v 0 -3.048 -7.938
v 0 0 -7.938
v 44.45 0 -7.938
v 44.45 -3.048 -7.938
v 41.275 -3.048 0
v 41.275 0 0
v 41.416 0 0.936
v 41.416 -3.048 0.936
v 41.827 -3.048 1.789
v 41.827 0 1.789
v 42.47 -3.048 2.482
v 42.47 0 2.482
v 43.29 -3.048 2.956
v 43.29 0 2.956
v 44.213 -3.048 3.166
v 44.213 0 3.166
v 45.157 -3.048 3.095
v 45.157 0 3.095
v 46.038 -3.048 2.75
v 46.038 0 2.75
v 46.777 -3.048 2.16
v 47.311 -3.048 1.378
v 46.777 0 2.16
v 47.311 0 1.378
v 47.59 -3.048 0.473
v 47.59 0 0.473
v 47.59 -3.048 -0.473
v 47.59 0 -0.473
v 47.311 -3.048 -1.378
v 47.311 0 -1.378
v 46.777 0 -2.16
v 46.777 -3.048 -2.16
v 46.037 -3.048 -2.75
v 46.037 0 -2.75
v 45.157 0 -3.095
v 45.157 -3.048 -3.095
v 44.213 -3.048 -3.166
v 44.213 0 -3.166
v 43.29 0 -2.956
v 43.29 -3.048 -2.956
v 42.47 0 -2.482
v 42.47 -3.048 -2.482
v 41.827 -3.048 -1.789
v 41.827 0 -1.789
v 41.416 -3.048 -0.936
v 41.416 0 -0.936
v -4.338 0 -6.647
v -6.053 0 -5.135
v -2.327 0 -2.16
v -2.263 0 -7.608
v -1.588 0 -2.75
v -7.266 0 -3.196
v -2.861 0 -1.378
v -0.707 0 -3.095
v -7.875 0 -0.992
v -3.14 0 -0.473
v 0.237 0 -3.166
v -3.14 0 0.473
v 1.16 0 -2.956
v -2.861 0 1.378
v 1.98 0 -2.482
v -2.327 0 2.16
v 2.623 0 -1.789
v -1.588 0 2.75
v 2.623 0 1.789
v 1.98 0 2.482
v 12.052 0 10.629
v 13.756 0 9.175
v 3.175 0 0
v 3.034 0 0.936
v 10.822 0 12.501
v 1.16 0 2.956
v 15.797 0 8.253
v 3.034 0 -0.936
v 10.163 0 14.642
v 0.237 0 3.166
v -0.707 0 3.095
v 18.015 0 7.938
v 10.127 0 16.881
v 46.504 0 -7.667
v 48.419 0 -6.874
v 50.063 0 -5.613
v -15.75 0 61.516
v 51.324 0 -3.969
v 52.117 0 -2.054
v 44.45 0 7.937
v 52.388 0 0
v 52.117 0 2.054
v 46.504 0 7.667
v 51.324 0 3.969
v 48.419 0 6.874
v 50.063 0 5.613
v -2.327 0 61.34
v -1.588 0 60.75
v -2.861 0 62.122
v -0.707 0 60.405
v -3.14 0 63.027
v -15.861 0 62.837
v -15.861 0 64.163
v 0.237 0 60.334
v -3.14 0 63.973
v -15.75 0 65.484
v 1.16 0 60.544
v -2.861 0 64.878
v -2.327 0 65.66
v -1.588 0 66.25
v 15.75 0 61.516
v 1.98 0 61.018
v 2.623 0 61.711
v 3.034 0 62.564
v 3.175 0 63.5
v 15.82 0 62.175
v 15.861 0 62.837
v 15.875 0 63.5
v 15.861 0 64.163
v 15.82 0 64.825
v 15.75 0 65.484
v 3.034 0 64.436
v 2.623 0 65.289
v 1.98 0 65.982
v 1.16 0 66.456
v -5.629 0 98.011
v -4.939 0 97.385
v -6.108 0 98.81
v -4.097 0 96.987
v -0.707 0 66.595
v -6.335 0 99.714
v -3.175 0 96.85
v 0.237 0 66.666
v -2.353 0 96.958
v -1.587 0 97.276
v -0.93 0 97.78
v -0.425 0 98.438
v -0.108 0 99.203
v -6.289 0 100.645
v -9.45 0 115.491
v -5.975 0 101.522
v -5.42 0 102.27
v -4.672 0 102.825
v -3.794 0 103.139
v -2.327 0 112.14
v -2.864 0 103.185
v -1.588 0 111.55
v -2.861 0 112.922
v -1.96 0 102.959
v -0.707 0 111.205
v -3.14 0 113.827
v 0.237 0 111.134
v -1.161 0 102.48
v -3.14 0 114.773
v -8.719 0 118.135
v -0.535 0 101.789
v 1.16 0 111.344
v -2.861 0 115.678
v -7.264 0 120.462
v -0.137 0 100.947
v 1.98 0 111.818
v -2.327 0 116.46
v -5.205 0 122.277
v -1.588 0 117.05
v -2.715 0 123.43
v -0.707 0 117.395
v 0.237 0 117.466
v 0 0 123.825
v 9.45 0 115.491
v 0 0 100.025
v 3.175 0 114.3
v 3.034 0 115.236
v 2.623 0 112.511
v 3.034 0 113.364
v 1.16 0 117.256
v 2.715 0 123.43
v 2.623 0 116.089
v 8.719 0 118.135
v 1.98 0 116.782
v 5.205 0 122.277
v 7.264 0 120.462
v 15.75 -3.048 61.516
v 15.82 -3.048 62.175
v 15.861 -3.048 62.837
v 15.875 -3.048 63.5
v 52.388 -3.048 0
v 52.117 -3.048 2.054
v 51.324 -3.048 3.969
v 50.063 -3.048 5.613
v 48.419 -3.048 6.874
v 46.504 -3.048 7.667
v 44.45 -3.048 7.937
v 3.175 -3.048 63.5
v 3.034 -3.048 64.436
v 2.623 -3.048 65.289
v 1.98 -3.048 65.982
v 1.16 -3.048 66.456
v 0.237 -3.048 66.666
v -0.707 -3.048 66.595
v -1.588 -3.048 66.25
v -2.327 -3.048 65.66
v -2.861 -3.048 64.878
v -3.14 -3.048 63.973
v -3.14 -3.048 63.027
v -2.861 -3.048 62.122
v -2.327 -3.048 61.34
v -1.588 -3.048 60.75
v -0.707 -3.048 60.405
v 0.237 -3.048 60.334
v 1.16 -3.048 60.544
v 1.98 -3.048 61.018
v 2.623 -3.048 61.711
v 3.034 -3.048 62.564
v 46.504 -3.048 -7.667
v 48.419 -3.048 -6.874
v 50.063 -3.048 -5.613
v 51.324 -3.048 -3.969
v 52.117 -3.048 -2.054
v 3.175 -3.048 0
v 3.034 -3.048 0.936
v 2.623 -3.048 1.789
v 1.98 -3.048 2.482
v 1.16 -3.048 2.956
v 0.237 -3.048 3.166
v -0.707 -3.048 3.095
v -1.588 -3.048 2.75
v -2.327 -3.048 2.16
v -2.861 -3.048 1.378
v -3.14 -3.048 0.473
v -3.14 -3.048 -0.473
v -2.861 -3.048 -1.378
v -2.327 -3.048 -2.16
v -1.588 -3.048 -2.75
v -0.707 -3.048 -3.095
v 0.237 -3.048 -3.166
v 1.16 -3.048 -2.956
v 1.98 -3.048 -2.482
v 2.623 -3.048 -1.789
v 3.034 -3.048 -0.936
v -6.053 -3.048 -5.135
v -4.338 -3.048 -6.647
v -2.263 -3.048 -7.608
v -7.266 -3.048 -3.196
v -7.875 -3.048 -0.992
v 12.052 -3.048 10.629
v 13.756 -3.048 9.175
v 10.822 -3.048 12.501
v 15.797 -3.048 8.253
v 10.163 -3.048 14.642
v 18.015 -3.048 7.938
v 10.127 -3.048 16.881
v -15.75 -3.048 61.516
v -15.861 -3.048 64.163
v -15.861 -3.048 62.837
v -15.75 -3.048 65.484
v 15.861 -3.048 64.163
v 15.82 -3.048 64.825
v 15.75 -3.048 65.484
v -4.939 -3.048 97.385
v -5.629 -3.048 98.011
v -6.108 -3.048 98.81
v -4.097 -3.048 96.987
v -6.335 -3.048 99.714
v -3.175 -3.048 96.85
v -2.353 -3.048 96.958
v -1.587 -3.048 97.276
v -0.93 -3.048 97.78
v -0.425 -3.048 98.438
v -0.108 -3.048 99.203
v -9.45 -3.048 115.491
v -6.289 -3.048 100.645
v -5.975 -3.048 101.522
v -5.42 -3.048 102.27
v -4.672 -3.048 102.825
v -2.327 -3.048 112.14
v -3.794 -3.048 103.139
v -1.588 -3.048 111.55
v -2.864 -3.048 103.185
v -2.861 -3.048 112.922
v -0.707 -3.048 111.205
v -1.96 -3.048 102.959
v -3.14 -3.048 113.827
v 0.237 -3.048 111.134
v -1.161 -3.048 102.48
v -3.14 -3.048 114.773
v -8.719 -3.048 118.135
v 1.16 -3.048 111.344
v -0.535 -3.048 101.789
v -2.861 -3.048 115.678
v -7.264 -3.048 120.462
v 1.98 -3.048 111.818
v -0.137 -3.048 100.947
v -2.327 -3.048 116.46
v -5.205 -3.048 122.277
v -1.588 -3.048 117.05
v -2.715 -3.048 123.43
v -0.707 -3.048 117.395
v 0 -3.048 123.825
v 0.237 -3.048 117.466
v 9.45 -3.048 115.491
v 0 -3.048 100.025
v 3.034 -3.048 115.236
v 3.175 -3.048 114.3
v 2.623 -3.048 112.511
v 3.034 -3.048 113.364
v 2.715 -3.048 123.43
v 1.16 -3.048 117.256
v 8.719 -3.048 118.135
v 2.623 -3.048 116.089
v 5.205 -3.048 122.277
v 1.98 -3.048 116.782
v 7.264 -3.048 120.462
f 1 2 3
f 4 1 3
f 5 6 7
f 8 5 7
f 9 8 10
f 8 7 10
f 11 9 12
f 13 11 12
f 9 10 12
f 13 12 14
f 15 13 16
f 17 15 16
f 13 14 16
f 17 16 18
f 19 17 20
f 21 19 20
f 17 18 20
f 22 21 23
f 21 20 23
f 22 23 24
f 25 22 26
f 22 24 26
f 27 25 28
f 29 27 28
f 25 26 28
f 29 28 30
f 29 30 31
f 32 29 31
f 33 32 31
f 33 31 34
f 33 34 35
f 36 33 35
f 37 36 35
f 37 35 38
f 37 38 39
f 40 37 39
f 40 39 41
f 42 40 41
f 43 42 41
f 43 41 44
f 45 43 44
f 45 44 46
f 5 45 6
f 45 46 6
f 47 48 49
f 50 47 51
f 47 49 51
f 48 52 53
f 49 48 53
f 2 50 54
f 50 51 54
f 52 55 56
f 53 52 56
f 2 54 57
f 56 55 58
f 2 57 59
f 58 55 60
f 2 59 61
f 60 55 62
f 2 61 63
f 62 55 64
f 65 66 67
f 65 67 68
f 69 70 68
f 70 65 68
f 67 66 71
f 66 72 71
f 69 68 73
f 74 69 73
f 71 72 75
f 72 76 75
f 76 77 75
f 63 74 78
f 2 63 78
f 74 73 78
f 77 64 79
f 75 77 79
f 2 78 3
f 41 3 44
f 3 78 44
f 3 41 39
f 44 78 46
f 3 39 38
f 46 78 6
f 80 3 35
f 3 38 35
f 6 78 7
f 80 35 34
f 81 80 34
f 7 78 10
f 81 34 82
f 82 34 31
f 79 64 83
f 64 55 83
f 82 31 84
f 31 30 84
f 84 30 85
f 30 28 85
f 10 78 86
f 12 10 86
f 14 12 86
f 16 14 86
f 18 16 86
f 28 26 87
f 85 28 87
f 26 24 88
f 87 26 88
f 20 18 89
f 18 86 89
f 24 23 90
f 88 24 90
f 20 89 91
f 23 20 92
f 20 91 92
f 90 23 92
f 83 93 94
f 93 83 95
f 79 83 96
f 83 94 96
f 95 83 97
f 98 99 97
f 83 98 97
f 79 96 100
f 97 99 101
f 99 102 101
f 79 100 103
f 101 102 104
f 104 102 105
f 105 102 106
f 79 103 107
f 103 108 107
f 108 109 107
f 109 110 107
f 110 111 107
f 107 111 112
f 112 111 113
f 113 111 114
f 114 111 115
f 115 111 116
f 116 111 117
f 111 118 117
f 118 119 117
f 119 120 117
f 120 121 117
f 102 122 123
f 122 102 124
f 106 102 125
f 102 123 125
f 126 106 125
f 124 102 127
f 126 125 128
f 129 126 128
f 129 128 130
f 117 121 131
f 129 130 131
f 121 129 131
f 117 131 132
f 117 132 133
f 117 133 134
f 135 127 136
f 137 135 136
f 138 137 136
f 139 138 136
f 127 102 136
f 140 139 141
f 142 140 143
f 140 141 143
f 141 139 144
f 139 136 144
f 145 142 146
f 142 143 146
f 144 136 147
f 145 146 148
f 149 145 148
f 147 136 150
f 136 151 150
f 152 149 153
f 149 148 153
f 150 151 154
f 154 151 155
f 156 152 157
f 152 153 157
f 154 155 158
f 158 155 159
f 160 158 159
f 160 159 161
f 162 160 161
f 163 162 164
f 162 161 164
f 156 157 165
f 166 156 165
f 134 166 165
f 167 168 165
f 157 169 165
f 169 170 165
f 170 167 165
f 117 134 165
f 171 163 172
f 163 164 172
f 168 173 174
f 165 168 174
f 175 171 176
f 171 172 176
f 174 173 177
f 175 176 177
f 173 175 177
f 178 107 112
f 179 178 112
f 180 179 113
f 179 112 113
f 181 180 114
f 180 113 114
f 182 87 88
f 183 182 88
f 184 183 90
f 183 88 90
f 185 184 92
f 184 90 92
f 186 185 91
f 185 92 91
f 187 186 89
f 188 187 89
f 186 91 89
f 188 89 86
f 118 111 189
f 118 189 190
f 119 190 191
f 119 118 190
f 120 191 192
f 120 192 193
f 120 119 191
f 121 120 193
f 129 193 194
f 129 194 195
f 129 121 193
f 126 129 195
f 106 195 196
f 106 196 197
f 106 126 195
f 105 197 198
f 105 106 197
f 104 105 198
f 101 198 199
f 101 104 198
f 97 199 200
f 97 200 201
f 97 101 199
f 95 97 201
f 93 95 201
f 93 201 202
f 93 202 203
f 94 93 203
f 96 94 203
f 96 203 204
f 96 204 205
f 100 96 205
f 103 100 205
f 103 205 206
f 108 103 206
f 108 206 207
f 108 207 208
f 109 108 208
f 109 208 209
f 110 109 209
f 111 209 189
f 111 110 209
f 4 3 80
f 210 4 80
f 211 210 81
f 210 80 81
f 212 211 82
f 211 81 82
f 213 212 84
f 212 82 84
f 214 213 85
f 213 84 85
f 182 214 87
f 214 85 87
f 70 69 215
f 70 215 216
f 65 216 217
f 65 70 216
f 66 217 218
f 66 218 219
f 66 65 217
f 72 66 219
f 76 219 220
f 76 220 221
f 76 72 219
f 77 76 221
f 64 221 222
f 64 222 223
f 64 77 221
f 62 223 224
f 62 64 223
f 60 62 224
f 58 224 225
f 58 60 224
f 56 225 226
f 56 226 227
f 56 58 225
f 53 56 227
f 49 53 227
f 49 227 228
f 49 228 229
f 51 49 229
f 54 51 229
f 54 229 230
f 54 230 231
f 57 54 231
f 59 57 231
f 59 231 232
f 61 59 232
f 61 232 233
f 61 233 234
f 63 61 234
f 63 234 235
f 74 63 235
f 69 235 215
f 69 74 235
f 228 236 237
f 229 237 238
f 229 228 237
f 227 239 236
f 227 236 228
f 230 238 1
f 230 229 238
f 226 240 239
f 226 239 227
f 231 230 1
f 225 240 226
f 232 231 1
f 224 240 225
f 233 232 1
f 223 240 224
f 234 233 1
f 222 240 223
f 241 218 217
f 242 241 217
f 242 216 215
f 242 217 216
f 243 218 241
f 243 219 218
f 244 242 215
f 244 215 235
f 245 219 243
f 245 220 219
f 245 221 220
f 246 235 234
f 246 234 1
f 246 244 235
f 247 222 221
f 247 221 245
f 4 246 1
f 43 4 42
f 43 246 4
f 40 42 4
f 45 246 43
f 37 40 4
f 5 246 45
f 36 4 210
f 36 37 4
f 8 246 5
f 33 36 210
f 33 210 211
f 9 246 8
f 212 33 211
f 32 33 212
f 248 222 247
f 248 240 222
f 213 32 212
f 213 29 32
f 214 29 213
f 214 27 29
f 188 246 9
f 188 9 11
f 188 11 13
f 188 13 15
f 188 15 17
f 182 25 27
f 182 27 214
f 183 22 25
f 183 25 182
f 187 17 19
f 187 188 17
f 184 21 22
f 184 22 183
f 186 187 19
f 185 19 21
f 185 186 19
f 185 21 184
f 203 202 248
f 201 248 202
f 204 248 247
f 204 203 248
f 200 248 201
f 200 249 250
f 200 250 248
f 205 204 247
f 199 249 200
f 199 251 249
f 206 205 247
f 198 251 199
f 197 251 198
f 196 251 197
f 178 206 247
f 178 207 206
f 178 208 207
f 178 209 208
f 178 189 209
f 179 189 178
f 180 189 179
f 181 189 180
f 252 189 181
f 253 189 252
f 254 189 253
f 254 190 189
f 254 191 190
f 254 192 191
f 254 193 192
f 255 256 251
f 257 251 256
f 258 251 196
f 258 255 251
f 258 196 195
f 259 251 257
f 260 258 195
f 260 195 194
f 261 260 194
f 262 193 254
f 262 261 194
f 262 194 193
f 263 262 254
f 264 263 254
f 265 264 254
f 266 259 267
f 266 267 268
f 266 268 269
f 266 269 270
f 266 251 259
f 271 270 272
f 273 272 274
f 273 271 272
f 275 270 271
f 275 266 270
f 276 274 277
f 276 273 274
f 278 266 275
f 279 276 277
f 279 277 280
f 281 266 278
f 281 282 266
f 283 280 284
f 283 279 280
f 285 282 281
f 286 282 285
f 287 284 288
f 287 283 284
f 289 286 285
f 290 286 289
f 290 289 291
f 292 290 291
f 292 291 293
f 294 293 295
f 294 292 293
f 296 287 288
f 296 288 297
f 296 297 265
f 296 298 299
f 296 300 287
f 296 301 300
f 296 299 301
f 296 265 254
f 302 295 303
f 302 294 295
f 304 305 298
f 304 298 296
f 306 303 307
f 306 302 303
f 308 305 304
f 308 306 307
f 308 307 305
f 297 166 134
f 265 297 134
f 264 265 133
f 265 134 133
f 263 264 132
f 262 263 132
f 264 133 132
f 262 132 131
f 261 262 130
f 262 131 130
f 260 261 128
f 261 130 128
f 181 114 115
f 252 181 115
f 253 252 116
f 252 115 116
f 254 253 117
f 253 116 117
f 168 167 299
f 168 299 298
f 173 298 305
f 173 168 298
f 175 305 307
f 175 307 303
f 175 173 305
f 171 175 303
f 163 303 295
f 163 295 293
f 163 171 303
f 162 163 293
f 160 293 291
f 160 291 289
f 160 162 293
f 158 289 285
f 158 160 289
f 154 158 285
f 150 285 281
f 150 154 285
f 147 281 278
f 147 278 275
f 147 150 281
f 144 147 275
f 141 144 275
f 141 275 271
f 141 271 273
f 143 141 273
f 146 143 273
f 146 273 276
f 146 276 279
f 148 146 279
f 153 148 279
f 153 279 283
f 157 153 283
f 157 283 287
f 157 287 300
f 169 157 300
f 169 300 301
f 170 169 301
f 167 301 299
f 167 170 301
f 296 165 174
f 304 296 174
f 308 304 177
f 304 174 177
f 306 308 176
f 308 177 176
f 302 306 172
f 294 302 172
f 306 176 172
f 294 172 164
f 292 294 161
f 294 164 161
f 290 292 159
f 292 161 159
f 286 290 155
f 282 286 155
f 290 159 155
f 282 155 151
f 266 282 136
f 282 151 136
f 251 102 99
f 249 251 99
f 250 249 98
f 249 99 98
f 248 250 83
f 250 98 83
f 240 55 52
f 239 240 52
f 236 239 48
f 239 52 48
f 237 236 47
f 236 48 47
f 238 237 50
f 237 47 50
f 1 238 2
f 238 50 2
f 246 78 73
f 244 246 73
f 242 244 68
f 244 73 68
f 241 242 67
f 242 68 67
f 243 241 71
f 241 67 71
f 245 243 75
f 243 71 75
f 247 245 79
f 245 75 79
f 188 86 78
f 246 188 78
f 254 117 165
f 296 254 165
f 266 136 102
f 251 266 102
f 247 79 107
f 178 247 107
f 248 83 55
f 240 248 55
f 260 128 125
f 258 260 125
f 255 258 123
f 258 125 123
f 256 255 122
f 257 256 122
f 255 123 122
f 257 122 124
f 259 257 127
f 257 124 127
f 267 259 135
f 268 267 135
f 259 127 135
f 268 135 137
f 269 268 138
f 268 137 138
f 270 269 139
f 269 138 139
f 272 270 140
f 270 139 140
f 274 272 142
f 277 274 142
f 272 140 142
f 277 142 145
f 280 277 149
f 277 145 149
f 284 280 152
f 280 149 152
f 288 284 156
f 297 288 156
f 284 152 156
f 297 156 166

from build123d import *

# Parameters (mm, degrees)
F0_R     = 3.175
F1_DEPTH = 3.048


with BuildPart() as f1:
    # F0 (on Front) → F1 (new body)
    with BuildSketch(Plane.XZ):
        with BuildLine():
            ThreePointArc((0, -7.9375), (5.6126600757, -5.6126600757), (7.9375, 0))
            ThreePointArc((7.9375, 0), (-0.4970693683, 7.9219207452), (-7.8752441368, -0.9921875))
            ThreePointArc((-7.8752441368, -0.9921875), (-5.2501627579, -5.953125), (0, -7.9375))
        make_face()
        Circle(F0_R, mode=Mode.SUBTRACT)
        with BuildLine():
            ThreePointArc((-7.8752441368, -0.9921875), (-0.4970693683, 7.9219207452), (7.9375, 0))
            Line((7.9375, 0), (36.5125, 0))
            ThreePointArc((36.5125, 0), (38.8373399243, 5.6126600757), (44.45, 7.9375))
            Line((44.45, 7.9375), (18.0149584735, 7.9375))
            ThreePointArc((18.0149584735, 7.9375), (12.0523084735, 10.6291369817), (10.127113946, 16.881475))
            Line((10.127113946, 16.881475), (15.7504882737, 61.515625))
            ThreePointArc((15.7504882737, 61.515625), (0, 47.625), (-15.7504882737, 61.515625))
            Line((-15.7504882737, 61.515625), (-7.8752441368, -0.9921875))
        make_face()
        with BuildLine():
            Line((36.5125, 0), (7.9375, 0))
            ThreePointArc((7.9375, 0), (5.6126600757, -5.6126600757), (0, -7.9375))
            Line((0, -7.9375), (44.45, -7.9375))
            ThreePointArc((44.45, -7.9375), (38.8373399243, -5.6126600757), (36.5125, 0))
        make_face()
        with BuildLine():
            ThreePointArc((44.45, 7.9375), (38.8373399243, 5.6126600757), (36.5125, 0))
            ThreePointArc((36.5125, 0), (38.8373399243, -5.6126600757), (44.45, -7.9375))
            ThreePointArc((44.45, -7.9375), (50.0626600757, -5.6126600757), (52.3875, 0))
            ThreePointArc((52.3875, 0), (50.0626600757, 5.6126600757), (44.45, 7.9375))
        make_face()
        with BuildLine():
            ThreePointArc((47.625, 0), (44.45, -3.175), (41.275, 0))
            ThreePointArc((41.275, 0), (44.45, 3.175), (47.625, 0))
        make_face(mode=Mode.SUBTRACT)
        with BuildLine():
            ThreePointArc((-15.7504882737, 65.484375), (-15.875, 63.5), (-15.7504882737, 61.515625))
            ThreePointArc((-15.7504882737, 61.515625), (0, 47.625), (15.7504882737, 61.515625))
            ThreePointArc((15.7504882737, 61.515625), (15.8438414904, 62.5058612634), (15.875, 63.5))
            ThreePointArc((15.875, 63.5), (15.8438414904, 64.4941387366), (15.7504882737, 65.484375))
            ThreePointArc((15.7504882737, 65.484375), (9.2504686451, 76.40133539), (-3.175, 79.0542598667))
            ThreePointArc((-3.175, 79.0542598667), (-11.6438383029, 74.2905817534), (-15.7504882737, 65.484375))
        make_face()
        with Locations((0, 63.5)):
            Circle(F0_R, mode=Mode.SUBTRACT)
        with BuildLine():
            Line((-9.4502929642, 115.490625), (-15.7504882737, 65.484375))
            ThreePointArc((-15.7504882737, 65.484375), (-11.6438383029, 74.2905817534), (-3.175, 79.0542598667))
            ThreePointArc((-3.175, 79.0542598667), (9.2504686451, 76.40133539), (15.7504882737, 65.484375))
            Line((15.7504882737, 65.484375), (9.4502929642, 115.490625))
            ThreePointArc((9.4502929642, 115.490625), (9.5063048942, 114.896483242), (9.525, 114.3))
            ThreePointArc((9.525, 114.3), (-0.596483242, 104.7936951058), (-9.4502929642, 115.490625))
        make_face()
        with BuildLine():
            ThreePointArc((0, 100.0252), (-0.9299359697, 97.7801359697), (-3.175, 96.8502))
            ThreePointArc((-3.175, 96.8502), (-5.4200640303, 102.2702640303), (0, 100.0252))
        make_face(mode=Mode.SUBTRACT)
        with BuildLine():
            ThreePointArc((9.4502929642, 115.490625), (0, 123.825), (-9.4502929642, 115.490625))
            ThreePointArc((-9.4502929642, 115.490625), (-0.596483242, 104.7936951058), (9.525, 114.3))
            ThreePointArc((9.525, 114.3), (9.5063048942, 114.896483242), (9.4502929642, 115.490625))
        make_face()
        with Locations((0, 114.3)):
            Circle(F0_R, mode=Mode.SUBTRACT)
    extrude(amount=F1_DEPTH)


solid = f1.part
